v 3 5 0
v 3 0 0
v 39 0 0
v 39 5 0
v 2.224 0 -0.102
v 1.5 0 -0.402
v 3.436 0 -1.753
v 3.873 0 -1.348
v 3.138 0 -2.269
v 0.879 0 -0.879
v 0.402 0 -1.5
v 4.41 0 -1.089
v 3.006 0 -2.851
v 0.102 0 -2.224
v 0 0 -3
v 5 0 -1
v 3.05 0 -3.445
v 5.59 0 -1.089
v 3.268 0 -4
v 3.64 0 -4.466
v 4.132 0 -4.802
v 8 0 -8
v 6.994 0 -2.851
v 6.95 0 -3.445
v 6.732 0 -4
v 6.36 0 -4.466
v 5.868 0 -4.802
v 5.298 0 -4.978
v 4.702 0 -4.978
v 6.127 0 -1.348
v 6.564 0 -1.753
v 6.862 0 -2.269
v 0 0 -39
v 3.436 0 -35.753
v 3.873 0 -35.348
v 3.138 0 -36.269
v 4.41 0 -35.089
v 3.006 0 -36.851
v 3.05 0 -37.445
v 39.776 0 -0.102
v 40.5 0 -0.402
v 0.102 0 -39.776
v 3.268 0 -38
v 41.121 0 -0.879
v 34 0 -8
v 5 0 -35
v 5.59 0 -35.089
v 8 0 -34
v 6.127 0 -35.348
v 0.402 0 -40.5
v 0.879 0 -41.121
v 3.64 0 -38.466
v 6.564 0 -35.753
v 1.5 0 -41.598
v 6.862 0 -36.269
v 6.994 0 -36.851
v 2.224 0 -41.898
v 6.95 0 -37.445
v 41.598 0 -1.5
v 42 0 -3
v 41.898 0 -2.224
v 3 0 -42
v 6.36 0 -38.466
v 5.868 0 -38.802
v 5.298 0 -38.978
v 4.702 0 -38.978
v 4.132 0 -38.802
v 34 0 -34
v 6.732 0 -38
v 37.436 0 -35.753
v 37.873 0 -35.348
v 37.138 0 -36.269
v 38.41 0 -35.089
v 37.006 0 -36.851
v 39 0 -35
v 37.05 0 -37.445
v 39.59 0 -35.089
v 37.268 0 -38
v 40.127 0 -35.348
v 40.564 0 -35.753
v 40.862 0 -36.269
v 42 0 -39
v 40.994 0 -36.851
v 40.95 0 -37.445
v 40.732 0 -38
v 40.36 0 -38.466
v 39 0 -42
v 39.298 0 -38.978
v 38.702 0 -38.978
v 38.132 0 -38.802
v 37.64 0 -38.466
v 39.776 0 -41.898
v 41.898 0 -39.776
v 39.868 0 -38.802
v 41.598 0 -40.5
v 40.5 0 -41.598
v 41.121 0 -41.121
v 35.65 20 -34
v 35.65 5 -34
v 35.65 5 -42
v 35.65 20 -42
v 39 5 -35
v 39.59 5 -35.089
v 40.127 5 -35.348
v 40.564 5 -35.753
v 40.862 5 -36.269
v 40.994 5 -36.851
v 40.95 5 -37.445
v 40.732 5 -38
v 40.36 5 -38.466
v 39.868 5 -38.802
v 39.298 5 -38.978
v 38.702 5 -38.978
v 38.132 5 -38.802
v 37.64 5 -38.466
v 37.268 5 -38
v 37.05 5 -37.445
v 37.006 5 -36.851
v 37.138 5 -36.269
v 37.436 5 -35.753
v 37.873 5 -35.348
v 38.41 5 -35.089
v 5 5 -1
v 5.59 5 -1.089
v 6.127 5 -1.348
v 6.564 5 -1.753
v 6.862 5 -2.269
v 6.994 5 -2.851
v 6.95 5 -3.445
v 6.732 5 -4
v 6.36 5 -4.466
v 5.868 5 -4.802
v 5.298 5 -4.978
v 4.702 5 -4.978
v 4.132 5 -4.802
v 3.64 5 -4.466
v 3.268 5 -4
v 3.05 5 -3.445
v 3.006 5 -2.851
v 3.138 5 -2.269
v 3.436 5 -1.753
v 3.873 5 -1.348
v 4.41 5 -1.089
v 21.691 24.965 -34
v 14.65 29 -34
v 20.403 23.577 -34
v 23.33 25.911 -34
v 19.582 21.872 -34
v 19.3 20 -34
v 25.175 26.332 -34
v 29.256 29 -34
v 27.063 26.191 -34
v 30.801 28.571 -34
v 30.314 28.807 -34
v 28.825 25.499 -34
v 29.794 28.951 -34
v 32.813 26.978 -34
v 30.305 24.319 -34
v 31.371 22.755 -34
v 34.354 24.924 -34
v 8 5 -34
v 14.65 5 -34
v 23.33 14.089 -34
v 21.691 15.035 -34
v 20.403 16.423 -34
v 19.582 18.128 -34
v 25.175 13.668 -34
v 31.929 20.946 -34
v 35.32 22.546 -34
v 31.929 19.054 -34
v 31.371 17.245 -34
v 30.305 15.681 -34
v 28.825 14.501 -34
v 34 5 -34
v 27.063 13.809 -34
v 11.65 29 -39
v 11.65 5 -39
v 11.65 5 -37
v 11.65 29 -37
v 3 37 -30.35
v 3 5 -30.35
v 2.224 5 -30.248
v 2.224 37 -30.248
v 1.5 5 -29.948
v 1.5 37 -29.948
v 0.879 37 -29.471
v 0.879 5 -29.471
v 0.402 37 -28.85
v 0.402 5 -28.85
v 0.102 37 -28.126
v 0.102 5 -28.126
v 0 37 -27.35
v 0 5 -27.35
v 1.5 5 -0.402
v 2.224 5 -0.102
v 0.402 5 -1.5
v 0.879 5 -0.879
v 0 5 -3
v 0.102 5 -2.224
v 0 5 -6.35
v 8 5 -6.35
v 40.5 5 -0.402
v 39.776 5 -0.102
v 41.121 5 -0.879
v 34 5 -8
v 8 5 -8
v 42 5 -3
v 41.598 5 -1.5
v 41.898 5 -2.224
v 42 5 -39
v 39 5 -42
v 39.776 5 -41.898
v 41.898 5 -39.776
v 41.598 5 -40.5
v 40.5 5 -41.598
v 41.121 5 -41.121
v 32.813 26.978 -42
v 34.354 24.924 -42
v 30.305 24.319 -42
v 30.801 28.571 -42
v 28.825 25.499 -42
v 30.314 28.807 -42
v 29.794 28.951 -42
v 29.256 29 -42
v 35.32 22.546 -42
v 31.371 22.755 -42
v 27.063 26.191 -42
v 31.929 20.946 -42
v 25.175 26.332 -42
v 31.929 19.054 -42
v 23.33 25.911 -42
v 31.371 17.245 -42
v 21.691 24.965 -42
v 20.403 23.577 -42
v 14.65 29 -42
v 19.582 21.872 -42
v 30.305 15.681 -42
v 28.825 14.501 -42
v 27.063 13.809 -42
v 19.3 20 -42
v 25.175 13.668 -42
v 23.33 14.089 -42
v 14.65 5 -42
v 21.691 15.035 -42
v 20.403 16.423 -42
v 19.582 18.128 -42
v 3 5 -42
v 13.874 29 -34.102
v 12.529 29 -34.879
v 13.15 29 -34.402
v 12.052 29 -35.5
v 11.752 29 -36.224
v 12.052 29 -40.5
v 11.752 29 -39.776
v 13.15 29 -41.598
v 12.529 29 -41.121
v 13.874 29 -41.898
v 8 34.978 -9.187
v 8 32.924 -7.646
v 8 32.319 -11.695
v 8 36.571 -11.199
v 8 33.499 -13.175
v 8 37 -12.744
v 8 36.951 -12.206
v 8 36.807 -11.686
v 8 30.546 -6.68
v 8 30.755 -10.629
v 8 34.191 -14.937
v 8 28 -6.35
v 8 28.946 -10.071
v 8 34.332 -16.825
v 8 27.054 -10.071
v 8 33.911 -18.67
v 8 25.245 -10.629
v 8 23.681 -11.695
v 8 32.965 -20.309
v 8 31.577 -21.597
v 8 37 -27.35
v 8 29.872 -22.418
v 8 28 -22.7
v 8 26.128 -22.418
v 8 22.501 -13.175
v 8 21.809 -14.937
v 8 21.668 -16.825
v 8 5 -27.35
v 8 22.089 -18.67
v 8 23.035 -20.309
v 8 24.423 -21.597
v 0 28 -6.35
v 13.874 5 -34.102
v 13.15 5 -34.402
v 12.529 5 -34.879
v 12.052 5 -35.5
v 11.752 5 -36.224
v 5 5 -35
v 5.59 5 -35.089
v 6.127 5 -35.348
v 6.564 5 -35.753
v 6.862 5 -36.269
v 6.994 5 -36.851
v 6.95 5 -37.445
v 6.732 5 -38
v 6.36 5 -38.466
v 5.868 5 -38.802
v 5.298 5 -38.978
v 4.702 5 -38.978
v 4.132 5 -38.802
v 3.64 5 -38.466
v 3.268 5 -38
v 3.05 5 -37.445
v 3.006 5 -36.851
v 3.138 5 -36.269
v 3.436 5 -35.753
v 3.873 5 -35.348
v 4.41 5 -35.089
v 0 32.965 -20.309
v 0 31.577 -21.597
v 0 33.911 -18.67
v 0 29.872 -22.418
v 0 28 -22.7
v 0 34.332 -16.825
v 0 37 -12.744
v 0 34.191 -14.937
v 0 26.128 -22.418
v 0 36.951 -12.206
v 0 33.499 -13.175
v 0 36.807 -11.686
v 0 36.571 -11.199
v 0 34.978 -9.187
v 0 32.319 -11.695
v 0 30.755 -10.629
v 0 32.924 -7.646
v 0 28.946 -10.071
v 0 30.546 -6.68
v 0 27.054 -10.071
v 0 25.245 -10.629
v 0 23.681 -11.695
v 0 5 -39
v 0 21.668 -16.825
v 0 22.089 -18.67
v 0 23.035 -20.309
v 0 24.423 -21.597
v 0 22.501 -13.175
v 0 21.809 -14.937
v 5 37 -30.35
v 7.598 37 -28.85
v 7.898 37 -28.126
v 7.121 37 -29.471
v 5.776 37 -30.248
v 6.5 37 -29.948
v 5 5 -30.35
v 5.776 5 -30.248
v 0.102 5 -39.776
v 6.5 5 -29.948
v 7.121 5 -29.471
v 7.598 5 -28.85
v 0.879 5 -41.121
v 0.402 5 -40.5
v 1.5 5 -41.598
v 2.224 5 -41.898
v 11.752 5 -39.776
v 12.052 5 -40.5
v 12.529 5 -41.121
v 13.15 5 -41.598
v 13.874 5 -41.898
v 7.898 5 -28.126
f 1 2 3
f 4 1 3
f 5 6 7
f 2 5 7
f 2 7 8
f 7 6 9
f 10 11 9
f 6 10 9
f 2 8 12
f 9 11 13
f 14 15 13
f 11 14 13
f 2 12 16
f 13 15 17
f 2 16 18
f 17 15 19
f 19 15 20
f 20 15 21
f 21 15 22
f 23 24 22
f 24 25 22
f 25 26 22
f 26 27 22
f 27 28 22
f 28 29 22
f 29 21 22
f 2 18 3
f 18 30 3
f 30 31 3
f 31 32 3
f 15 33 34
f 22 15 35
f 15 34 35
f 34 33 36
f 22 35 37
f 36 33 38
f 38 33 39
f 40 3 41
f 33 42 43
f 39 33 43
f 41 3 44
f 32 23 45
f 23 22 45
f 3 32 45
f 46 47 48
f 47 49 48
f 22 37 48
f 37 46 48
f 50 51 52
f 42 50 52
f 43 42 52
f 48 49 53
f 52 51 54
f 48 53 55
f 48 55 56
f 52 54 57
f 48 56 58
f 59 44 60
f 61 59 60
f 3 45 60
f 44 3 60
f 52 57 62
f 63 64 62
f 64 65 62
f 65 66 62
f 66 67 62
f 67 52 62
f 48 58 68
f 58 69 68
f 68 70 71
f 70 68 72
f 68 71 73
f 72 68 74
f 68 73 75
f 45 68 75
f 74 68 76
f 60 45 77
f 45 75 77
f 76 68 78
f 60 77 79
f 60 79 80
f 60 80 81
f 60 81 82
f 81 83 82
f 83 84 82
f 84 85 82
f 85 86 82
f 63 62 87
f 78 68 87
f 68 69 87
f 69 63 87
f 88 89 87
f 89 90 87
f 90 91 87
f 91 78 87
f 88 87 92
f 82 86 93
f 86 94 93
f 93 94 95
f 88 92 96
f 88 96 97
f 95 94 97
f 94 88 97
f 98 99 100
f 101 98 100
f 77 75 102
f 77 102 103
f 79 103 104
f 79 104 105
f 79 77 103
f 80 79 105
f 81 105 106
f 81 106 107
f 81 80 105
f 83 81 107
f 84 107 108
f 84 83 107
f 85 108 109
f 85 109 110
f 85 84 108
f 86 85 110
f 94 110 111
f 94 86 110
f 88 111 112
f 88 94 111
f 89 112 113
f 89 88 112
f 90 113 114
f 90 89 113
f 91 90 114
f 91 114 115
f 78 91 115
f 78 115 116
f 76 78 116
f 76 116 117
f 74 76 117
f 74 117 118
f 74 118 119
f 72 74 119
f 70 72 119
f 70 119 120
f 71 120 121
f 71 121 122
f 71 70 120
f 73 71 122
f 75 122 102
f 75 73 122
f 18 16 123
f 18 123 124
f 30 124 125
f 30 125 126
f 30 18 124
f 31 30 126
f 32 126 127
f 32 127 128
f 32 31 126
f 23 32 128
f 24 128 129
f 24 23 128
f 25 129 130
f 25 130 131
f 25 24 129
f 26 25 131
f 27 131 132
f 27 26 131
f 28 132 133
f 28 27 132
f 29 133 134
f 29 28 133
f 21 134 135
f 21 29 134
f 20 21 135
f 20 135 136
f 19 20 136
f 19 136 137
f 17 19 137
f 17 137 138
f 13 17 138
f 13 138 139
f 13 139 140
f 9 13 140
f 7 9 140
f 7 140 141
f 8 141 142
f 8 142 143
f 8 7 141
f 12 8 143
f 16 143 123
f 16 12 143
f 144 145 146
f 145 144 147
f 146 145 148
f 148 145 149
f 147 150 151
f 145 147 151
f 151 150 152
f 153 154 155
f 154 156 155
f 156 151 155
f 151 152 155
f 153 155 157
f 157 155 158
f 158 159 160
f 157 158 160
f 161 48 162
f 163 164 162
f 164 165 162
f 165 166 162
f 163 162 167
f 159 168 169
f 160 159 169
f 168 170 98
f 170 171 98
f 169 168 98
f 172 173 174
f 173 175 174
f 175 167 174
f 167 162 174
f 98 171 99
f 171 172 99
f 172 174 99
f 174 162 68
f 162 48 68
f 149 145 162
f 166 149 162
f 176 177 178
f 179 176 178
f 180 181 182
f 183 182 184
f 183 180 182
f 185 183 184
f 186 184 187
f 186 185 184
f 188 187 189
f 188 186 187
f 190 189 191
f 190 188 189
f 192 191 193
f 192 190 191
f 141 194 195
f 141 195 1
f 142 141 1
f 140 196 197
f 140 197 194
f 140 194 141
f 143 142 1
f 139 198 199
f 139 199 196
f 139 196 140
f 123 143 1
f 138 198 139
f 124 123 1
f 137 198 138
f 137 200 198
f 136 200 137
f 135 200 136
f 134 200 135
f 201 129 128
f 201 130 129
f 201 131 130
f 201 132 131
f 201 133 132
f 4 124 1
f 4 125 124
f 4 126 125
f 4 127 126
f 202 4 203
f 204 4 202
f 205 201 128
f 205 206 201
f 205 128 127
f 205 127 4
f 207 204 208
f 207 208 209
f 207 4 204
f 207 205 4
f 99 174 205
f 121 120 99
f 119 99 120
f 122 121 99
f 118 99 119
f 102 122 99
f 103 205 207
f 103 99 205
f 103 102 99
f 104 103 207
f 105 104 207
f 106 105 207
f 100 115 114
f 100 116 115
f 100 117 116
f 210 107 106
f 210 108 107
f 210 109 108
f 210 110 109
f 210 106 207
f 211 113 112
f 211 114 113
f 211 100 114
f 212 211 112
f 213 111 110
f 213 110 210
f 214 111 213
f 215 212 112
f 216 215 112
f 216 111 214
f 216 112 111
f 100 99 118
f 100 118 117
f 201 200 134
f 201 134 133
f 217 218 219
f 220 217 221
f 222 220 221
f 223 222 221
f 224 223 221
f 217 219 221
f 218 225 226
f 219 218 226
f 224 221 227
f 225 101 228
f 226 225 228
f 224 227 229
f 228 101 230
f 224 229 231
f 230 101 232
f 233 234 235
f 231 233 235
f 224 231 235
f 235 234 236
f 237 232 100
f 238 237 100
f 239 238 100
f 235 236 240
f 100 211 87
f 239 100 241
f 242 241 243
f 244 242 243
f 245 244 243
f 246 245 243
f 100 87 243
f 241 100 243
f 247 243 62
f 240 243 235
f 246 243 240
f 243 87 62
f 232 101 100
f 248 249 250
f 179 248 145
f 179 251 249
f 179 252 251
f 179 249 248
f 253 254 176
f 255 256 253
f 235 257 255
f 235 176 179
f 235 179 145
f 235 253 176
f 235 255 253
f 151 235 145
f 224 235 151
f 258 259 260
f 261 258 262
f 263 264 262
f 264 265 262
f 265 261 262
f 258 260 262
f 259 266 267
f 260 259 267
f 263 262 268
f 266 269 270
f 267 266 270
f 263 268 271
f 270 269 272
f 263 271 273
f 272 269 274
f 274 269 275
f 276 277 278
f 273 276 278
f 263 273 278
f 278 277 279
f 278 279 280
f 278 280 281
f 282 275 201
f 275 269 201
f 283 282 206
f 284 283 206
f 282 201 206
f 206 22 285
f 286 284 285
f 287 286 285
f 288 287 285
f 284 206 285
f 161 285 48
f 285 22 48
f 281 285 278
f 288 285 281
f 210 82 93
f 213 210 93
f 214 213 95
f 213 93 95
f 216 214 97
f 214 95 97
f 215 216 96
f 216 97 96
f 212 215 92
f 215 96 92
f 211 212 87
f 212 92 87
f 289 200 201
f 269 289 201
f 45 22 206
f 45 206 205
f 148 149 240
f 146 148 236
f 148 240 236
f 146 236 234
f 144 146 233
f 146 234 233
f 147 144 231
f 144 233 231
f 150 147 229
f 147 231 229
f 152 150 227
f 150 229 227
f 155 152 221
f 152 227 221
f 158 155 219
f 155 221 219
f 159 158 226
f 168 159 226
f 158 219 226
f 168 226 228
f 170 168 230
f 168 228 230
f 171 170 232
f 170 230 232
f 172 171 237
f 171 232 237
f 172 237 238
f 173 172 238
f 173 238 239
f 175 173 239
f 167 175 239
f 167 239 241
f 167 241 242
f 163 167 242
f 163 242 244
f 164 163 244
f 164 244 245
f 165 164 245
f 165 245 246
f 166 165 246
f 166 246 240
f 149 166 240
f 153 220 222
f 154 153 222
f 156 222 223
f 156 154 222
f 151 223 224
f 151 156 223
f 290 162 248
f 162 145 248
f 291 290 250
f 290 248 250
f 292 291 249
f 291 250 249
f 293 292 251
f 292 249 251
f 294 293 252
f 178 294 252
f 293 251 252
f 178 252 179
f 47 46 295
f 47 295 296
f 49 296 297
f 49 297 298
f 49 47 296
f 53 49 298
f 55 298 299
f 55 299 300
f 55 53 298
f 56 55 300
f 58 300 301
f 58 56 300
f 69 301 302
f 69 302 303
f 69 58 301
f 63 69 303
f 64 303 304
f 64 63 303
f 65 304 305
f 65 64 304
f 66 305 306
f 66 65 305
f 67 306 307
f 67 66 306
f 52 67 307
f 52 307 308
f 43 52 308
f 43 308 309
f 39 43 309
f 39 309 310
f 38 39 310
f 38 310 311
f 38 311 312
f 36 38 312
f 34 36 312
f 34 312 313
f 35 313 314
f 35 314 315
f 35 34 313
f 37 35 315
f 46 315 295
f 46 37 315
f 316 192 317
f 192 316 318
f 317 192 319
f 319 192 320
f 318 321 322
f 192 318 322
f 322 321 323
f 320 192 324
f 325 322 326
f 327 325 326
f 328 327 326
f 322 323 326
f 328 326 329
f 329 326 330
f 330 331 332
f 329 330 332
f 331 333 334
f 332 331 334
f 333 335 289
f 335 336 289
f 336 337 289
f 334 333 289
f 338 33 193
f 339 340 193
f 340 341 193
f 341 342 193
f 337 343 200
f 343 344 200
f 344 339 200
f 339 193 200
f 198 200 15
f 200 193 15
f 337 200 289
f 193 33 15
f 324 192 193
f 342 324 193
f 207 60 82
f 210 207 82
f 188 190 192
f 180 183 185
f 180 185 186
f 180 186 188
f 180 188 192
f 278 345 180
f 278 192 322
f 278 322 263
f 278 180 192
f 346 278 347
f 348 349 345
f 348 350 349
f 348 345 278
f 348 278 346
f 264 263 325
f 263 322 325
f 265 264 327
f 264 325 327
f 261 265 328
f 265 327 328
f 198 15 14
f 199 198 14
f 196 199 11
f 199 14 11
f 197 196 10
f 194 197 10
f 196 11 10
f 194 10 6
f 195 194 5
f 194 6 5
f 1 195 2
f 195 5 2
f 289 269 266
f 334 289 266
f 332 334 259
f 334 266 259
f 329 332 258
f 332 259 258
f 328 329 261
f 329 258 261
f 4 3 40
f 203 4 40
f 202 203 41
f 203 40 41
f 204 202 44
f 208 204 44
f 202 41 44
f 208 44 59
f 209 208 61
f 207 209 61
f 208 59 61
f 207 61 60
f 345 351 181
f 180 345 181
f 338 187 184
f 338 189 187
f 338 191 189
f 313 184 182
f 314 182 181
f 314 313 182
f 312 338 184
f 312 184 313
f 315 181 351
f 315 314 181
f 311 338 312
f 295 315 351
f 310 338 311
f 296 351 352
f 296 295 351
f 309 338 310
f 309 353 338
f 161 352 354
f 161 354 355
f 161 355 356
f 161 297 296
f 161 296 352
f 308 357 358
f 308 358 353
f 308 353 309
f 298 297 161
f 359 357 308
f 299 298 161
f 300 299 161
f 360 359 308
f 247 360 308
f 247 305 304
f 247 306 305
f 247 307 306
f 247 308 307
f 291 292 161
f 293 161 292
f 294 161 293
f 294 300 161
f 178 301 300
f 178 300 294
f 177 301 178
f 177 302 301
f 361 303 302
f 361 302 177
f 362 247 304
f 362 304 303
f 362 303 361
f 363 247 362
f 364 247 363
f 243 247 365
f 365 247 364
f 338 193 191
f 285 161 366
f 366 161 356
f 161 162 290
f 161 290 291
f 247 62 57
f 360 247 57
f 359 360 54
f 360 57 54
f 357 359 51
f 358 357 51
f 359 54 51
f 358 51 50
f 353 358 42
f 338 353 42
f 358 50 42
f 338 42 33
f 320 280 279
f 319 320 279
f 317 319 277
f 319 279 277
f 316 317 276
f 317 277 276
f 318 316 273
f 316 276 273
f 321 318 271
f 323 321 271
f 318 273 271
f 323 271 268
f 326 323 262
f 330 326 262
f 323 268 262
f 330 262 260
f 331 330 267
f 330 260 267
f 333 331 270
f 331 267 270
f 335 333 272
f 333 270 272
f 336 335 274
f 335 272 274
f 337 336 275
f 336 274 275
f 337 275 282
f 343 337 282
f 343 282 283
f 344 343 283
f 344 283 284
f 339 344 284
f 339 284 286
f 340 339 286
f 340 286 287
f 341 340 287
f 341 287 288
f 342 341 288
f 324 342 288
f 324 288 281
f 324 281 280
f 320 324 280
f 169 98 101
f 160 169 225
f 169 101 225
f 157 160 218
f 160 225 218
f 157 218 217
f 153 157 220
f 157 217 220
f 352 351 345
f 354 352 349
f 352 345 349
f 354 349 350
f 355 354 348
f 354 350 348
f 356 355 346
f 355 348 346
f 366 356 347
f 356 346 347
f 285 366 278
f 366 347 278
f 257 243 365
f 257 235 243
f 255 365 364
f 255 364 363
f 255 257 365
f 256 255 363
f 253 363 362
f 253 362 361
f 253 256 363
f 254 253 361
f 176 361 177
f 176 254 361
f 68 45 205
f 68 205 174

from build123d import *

# Parameters (mm, degrees)
SKETCH_1_R          = 2
SKETCH_1_W          = 26
SKETCH_1_H          = 26
EXTRUDE_1_DEPTH     = 5
EXTRUDE_2_DEPTH     = 24
EXTRUDE_3_DEPTH     = 32
CUT_EXTRUDE_1_REACH = 71.979
SKETCH_3_R          = 6.35
CUT_EXTRUDE_2_REACH = 67.49
SKETCH_4_R          = 6.35
FILLET_2_R          = 3


with BuildPart() as part:
    # 草图1 → 凸台-拉伸1 (new body)
    with BuildSketch(Plane(origin=(0, 0, 0), x_dir=(1, 0, 0), z_dir=(0, 1, 0))):
        with BuildLine():
            Line((3, 0), (39, 0))
            ThreePointArc((39, 0), (41.121320344, 0.878679656), (42, 3))
            Line((42, 3), (42, 39))
            ThreePointArc((42, 39), (41.121320344, 41.121320344), (39, 42))
            Line((39, 42), (3, 42))
            ThreePointArc((3, 42), (0.878679656, 41.121320344), (0, 39))
            Line((0, 39), (0, 3))
            ThreePointArc((0, 3), (0.878679656, 0.878679656), (3, 0))
        make_face()
        with Locations((5, 37)):
            Circle(SKETCH_1_R, mode=Mode.SUBTRACT)
        with Locations((39, 37)):
            Circle(SKETCH_1_R, mode=Mode.SUBTRACT)
        with Locations((5, 3)):
            Circle(SKETCH_1_R, mode=Mode.SUBTRACT)
        with Locations((21, 21)):
            Rectangle(SKETCH_1_W, SKETCH_1_H, mode=Mode.SUBTRACT)
    extrude(amount=EXTRUDE_1_DEPTH)

    # 草图2 → 凸台-拉伸2 (add)
    with BuildSketch(Plane(origin=(0, 5, 0), x_dir=(1, 0, 0), z_dir=(0, 1, 0))):
        Polygon((35.65, 34), (35.65, 42), (11.65, 42), (11.65, 34), (34, 34), align=None)
    extrude(amount=EXTRUDE_2_DEPTH)

    # 草图2<3> → 凸台-拉伸3 (add)
    with BuildSketch(Plane(origin=(0, 5, 0), x_dir=(1, 0, 0), z_dir=(0, 1, 0))):
        Polygon((8, 30.35), (0, 30.35), (0, 6.35), (8, 6.35), (8, 8), align=None)
    extrude(amount=EXTRUDE_3_DEPTH)

    # 草图3 → 切除-拉伸1 (cut, up to next)
    with BuildSketch(Plane(origin=(0, 0, -42), x_dir=(-1, 0, 0), z_dir=(0, 0, -1)), mode=Mode.PRIVATE) as cut_extrude_1_sk1:
        with BuildLine():
            Line((-30.008898944, 29), (-35.65, 29))
            Line((-35.65, 29), (-35.65, 20))
            ThreePointArc((-35.65, 20), (-34.123163206, 25.310885546), (-30.008898944, 29))
        make_face()
    cut_extrude_1_tool1 = extrude(cut_extrude_1_sk1.sketch, amount=-CUT_EXTRUDE_1_REACH, mode=Mode.PRIVATE) & part.part
    # 草图3 → 切除-拉伸1 (cut, up to next)
    with BuildSketch(Plane(origin=(0, 0, -42), x_dir=(-1, 0, 0), z_dir=(0, 0, -1)), mode=Mode.PRIVATE) as cut_extrude_1_sk2:
        with Locations((-25.65, 20)):
            Circle(SKETCH_3_R)
    cut_extrude_1_tool2 = extrude(cut_extrude_1_sk2.sketch, amount=-CUT_EXTRUDE_1_REACH, mode=Mode.PRIVATE) & part.part
    add(cut_extrude_1_tool1.solids().sort_by_distance((34.089564, 26.895646, -42))[0], mode=Mode.SUBTRACT)
    add(cut_extrude_1_tool2.solids().sort_by_distance((25.65, 20, -42))[0], mode=Mode.SUBTRACT)

    # 草图4 → 切除-拉伸2 (cut, up to next)
    with BuildSketch(Plane(origin=(8, 0, 0), x_dir=(0, 0, -1), z_dir=(1, 0, 0)), mode=Mode.PRIVATE) as cut_extrude_2_sk1:
        with BuildLine():
            Line((11.991101056, 37), (6.35, 37))
            Line((6.35, 37), (6.35, 28))
            ThreePointArc((6.35, 28), (7.876836794, 33.310885546), (11.991101056, 37))
        make_face()
    cut_extrude_2_tool1 = extrude(cut_extrude_2_sk1.sketch, amount=-CUT_EXTRUDE_2_REACH, mode=Mode.PRIVATE) & part.part
    # 草图4 → 切除-拉伸2 (cut, up to next)
    with BuildSketch(Plane(origin=(8, 0, 0), x_dir=(0, 0, -1), z_dir=(1, 0, 0)), mode=Mode.PRIVATE) as cut_extrude_2_sk2:
        with Locations((16.35, 28)):
            Circle(SKETCH_4_R)
    cut_extrude_2_tool2 = extrude(cut_extrude_2_sk2.sketch, amount=-CUT_EXTRUDE_2_REACH, mode=Mode.PRIVATE) & part.part
    add(cut_extrude_2_tool1.solids().sort_by_distance((8, 34.895646, -7.910436))[0], mode=Mode.SUBTRACT)
    add(cut_extrude_2_tool2.solids().sort_by_distance((8, 28, -16.35))[0], mode=Mode.SUBTRACT)

    # 圆角2
    fillet_2_edges = [part.edges().sort_by_distance(p)[0] for p in [
        (30.008898944, 29, -38),
        (11.65, 17, -42),
        (11.65, 17, -34),
        (4, 37, -11.991101056),
        (0, 21, -30.35),
        (8, 21, -30.35),
    ]]
    fillet(fillet_2_edges, radius=FILLET_2_R)


solid = part.part
